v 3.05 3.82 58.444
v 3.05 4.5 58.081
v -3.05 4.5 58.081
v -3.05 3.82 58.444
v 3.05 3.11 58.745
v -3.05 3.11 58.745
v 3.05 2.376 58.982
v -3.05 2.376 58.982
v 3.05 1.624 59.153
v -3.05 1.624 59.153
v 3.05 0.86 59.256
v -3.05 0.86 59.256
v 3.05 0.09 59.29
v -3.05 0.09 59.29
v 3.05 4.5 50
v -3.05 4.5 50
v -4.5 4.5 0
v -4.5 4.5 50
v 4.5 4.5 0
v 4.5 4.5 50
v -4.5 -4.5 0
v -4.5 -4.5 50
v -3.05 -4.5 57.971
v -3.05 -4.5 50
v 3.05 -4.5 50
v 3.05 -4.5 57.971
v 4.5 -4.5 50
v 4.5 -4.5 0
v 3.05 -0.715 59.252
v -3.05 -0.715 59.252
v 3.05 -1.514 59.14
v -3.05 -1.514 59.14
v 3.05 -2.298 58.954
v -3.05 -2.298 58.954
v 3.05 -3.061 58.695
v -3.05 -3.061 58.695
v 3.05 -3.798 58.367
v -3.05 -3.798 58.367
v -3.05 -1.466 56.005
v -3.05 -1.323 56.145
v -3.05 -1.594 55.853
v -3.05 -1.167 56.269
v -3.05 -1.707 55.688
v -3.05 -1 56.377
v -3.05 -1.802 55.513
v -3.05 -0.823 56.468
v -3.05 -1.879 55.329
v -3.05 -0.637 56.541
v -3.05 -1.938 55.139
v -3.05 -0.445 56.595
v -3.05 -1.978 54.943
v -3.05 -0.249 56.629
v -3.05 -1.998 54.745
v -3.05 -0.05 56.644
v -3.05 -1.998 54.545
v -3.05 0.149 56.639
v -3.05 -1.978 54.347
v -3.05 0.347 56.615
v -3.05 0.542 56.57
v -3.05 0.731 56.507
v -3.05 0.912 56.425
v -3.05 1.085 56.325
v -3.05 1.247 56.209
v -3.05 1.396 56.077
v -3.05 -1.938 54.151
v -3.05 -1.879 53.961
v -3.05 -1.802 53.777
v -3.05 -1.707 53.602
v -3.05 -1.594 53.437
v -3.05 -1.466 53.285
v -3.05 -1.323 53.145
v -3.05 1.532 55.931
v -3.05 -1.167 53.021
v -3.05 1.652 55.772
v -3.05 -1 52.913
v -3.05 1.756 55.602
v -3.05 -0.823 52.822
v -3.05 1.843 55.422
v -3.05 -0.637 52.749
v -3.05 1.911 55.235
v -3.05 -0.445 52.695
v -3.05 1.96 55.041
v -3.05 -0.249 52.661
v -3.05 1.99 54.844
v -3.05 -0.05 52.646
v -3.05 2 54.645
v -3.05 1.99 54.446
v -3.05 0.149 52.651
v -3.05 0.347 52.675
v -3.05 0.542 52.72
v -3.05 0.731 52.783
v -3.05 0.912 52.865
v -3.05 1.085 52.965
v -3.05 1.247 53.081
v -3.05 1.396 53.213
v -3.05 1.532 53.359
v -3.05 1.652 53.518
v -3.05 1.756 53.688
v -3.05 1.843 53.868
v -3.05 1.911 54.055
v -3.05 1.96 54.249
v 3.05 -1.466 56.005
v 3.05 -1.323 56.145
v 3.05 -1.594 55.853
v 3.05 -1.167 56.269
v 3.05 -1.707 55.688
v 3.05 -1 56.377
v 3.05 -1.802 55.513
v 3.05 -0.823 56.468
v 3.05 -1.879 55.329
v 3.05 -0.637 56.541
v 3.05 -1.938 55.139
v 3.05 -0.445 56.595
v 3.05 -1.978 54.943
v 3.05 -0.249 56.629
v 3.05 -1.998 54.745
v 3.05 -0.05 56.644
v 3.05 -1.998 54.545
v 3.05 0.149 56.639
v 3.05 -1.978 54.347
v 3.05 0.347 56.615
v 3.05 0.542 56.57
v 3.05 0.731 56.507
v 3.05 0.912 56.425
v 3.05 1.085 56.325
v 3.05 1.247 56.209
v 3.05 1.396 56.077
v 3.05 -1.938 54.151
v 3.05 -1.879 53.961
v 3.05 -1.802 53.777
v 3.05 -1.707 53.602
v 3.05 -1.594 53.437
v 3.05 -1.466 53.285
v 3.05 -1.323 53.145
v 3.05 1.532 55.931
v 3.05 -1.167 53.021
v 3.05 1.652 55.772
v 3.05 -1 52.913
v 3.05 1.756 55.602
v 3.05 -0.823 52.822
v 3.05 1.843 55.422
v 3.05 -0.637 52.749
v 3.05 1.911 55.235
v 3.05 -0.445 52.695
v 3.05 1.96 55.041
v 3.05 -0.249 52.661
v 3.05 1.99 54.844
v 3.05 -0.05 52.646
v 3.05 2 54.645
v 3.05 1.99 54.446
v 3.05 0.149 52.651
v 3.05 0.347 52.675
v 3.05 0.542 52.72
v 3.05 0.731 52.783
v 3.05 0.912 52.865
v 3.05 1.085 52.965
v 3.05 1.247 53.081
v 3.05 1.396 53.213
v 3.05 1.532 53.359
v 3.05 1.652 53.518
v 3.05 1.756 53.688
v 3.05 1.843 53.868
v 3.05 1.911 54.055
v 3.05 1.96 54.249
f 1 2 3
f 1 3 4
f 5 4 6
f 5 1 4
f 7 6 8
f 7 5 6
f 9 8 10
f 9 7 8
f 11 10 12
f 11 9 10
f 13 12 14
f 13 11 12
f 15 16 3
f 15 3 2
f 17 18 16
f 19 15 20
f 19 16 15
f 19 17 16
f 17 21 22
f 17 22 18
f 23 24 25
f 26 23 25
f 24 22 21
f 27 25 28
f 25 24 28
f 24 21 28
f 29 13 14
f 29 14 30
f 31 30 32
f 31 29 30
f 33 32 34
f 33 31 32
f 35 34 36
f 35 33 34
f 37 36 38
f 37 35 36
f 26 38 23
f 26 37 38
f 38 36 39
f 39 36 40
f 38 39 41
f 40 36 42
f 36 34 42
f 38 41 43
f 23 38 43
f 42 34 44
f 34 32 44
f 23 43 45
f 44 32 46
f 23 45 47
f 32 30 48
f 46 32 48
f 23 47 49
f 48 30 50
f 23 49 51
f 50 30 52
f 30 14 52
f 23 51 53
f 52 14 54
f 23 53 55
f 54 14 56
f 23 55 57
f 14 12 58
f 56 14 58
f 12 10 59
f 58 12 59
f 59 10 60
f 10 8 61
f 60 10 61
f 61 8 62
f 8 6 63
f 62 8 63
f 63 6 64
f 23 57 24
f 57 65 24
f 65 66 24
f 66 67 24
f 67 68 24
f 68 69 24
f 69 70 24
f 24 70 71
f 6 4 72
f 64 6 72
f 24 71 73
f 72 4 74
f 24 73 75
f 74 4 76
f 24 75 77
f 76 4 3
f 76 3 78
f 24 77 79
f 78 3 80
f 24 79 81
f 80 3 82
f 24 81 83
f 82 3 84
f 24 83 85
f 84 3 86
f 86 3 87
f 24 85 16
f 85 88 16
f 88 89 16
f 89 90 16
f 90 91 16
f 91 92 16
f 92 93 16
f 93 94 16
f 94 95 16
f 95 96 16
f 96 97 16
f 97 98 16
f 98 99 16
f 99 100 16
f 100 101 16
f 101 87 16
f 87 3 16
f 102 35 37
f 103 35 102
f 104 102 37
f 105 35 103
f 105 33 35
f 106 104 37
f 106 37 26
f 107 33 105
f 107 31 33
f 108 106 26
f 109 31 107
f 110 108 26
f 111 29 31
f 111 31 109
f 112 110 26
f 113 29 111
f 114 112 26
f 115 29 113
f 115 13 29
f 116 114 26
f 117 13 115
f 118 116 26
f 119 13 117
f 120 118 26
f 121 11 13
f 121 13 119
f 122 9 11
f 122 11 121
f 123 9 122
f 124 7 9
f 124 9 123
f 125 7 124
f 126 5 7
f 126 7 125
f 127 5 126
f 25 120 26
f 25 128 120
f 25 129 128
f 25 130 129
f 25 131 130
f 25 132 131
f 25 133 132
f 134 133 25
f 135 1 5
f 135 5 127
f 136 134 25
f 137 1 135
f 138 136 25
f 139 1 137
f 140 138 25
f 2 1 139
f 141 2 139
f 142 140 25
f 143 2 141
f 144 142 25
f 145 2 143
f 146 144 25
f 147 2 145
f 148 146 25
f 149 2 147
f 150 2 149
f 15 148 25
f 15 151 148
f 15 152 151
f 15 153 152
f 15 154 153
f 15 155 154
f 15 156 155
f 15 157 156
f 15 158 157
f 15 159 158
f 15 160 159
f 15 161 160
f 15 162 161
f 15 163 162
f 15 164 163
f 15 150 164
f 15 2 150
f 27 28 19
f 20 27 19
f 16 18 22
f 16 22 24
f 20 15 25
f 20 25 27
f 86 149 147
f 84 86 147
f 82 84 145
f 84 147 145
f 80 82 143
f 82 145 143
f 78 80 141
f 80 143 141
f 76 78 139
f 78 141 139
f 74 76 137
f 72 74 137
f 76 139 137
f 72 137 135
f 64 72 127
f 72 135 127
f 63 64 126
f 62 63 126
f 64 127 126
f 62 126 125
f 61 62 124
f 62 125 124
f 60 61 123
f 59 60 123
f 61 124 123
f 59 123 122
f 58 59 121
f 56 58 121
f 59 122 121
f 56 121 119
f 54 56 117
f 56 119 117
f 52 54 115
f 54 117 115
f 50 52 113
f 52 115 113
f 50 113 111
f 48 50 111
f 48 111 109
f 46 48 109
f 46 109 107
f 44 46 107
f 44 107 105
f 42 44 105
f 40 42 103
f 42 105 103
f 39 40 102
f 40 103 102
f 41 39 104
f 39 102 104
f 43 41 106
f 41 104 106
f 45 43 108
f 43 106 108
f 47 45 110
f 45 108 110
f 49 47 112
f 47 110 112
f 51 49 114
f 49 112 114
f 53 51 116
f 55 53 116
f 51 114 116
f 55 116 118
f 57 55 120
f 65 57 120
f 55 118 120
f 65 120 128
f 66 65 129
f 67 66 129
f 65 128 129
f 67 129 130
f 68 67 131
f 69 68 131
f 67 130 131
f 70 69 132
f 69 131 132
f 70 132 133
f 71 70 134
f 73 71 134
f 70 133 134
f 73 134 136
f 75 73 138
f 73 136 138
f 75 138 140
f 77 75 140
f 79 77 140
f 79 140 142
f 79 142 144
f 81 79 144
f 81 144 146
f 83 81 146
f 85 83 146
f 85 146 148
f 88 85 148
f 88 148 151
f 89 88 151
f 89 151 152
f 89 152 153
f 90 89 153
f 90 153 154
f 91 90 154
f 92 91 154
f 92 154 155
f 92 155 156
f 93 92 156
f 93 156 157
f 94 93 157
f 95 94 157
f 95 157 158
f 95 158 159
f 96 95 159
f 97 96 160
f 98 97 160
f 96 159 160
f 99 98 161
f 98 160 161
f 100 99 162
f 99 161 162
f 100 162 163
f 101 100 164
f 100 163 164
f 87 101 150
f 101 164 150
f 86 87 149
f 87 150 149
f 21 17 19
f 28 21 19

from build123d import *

# Parameters (mm, degrees)
ESQUISSE1_W        = 9
ESQUISSE1_H        = 9
BOSS_EXTRU_1_DEPTH = 50
BOSS_EXTRU_3_START = -1.45
ESQUISSE2_R        = 2
BOSS_EXTRU_3_DEPTH = 6.1


with BuildPart() as part:
    # Esquisse1 → Boss.-Extru.1 (new body)
    with BuildSketch(Plane.XY):
        Rectangle(ESQUISSE1_W, ESQUISSE1_H)
    extrude(amount=BOSS_EXTRU_1_DEPTH)

    # Esquisse2 → Boss.-Extru.3 (add)
    with BuildSketch(Plane(origin=(4.5, 0, 0), x_dir=(0, 0, -1), z_dir=(1, 0, 0)).offset(BOSS_EXTRU_3_START)):
        with BuildLine():
            Line((-50, 4.5), (-58.080541819, 4.5))
            ThreePointArc((-58.080541819, 4.5), (-58.982154324, 2.376383494), (-59.29, 0.089927018))
            ThreePointArc((-59.29, 0.089927018), (-58.953679263, -2.297932577), (-57.970885209, -4.5))
            Line((-57.970885209, -4.5), (-50, -4.5))
            Line((-50, -4.5), (-50, 4.5))
        make_face()
        with Locations(Location((-54.645, 0, 0), (0, 0, 90))):
            Circle(ESQUISSE2_R, mode=Mode.SUBTRACT)
    extrude(amount=-BOSS_EXTRU_3_DEPTH)


solid = part.part
